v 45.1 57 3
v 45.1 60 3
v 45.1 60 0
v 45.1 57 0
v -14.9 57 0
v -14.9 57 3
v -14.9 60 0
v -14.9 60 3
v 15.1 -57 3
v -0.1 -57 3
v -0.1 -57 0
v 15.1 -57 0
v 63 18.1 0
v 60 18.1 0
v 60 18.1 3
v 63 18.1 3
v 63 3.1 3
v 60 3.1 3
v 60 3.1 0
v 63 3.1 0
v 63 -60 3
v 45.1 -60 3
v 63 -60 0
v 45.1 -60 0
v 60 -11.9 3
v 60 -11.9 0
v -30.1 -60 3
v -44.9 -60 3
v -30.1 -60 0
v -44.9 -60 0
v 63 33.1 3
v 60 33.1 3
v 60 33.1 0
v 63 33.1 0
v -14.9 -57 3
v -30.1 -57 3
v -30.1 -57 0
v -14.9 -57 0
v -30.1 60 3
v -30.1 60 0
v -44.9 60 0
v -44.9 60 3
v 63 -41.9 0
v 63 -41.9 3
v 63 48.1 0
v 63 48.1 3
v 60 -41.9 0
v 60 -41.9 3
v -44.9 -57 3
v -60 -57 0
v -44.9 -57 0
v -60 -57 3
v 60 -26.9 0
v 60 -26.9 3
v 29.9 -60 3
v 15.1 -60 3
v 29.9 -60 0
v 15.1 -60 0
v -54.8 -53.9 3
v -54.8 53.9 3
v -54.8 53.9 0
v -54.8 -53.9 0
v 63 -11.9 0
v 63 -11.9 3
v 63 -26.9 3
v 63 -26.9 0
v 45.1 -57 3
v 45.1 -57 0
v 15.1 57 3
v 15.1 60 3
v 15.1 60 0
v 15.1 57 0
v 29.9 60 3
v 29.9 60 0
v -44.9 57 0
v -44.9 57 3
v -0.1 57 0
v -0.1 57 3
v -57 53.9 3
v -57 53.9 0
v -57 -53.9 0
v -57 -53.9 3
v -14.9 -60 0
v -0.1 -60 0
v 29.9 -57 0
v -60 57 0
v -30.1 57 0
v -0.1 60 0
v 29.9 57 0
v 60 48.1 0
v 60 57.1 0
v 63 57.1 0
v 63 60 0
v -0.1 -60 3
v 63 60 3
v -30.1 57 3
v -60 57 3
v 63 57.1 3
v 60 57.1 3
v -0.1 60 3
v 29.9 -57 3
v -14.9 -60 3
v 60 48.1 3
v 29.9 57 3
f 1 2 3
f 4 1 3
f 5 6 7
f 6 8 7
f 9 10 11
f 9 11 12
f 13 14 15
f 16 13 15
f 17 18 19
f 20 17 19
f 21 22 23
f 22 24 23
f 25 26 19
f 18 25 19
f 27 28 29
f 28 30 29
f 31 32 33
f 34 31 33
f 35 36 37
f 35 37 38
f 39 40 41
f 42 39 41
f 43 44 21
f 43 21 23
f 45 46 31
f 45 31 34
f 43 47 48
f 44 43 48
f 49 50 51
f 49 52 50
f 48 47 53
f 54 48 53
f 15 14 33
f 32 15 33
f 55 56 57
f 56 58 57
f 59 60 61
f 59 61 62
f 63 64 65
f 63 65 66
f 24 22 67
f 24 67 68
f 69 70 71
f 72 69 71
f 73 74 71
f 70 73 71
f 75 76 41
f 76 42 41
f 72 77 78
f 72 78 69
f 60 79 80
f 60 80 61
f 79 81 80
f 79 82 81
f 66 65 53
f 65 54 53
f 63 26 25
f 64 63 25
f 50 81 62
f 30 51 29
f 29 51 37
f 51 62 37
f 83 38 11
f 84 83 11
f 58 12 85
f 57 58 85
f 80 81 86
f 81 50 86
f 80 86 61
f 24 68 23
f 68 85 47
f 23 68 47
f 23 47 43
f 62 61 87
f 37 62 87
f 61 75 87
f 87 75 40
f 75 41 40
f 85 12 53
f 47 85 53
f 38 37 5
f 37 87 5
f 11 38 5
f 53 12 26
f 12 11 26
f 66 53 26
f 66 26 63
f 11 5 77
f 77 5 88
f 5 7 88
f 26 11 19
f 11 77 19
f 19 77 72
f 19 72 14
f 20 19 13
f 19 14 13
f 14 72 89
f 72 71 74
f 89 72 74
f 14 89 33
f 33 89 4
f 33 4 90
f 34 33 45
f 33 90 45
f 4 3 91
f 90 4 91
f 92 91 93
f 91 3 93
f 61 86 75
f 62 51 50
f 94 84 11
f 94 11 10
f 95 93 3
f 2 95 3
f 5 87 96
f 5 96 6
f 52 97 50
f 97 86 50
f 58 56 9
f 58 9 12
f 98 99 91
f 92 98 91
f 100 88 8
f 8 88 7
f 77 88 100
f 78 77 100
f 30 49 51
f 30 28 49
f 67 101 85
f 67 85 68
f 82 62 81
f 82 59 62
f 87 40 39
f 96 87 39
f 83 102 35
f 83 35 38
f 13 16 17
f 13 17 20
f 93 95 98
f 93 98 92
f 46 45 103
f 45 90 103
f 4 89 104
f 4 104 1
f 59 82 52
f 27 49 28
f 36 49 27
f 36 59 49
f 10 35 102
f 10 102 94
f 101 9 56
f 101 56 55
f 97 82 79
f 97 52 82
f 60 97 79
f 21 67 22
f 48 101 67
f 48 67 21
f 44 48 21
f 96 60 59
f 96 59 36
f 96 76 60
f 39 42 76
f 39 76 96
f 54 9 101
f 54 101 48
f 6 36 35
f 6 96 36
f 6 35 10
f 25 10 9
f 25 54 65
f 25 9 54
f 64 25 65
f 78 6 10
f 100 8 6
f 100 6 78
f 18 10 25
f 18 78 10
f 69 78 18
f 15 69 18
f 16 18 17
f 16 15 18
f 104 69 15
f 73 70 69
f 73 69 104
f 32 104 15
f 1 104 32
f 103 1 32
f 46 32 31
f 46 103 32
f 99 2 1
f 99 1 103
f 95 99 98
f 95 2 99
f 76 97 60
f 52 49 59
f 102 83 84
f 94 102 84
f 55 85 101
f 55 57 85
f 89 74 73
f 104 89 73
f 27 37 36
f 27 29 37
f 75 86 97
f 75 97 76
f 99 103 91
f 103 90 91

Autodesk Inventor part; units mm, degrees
ref_plane "YZ Plane" through (0, 0, 0) normal (1, 0, 0) x (0, 1, 0)
ref_plane "XZ Plane" through (0, 0, 0) normal (0, 1, 0) x (-1, 0, 0)
ref_plane "XY Plane" through (0, 0, 0) normal (0, 0, 1) x (1, 0, 0)
sketch "Esboço1" plane through (0, 0, 0) normal (0, 0, 1) x (1, 0, 0)
  line L0 (-60, -60) -> (60, -60)
  line L1 (60, -60) -> (60, 60)
  line L2 (60, 60) -> (-60, 60)
  line L3 (-60, 60) -> (-60, -60)
  line L4 (-60, -60) -> (60, 60) construction
  line L5 (60, -60) -> (-60, 60) construction
  point P0 (0, 0)
  dimension "d0" = 120
  dimension "d1" = 120
extrude "Extrusão1" add sketch "Esboço1" along normal blind 3
sketch "Esboço2" plane through (-60, 60, 0) normal (0, 1, 0) x (1, 0, 0)
  line L0 (120, -3) -> (0, -3) projected
  line L1 (120, 0) -> (0, 0) projected
  line L2 (0, -3) -> (15.1, -3)
  line L3 (15.1, -3) -> (15.1, 0)
  line L4 (15.1, 0) -> (0, 0)
  line L5 (0, 0) -> (0, -3)
  line L6 (-0.1, 0) -> (-0.1, -3)
  line L7 (29.9, 0) -> (29.9, -3)
  line L8 (45.1, 0) -> (30, 0)
  line L9 (30, -3) -> (45.1, -3)
  line L10 (45.1, -3) -> (45.1, 0)
  line L11 (59.9, 0) -> (59.9, -3)
  line L12 (75.1, 0) -> (60, 0)
  line L13 (60, -3) -> (75.1, -3)
  line L14 (75.1, -3) -> (75.1, 0)
  line L15 (89.9, 0) -> (89.9, -3)
  line L16 (105.1, 0) -> (90, 0)
  line L17 (90, -3) -> (105.1, -3)
  line L18 (105.1, -3) -> (105.1, 0)
  point P0 (89.9, 0)
  point P1 (59.9, 0)
  point P2 (29.9, 0)
  dimension "d4" = 15.1
  dimension "d57" = 30
  dimension "d63" = 0.1
extrude "Extrusão2" cut sketch "Esboço2" against normal blind 3 contours L0 L15 L1 L18 | L0 L11 L1 L14 | L0 L7 L1 L10 | L0 L5 L1 L3
sketch "Esboço3" plane through (-60, -60, 0) normal (0, -1, 0) x (1, 0, 0)
  line L0 (0, 0) -> (120, 0) projected
  line L1 (0, 3) -> (15.1, 3)
  line L2 (15.1, 3) -> (15.1, 0)
  line L3 (15.1, 0) -> (0, 0)
  line L4 (0, 0) -> (0, 3)
  line L5 (-0.1, 0) -> (-0.1, 3)
  line L6 (-0.1, 0) -> (15.1, 0)
  line L7 (15.1, 0) -> (15.1, 3)
  line L8 (15.1, 3) -> (-0.1, 3)
  line L9 (-0.1, 3) -> (-0.1, 0)
  line L10 (29.9, 0) -> (29.9, 3)
  line L11 (45.1, 0) -> (30, 0)
  line L12 (30, 3) -> (45.1, 3)
  line L13 (45.1, 3) -> (45.1, 0)
  line L14 (59.9, 0) -> (59.9, 3)
  line L15 (75.1, 0) -> (60, 0)
  line L16 (60, 3) -> (75.1, 3)
  line L17 (75.1, 3) -> (75.1, 0)
  line L18 (89.9, 0) -> (89.9, 3)
  line L19 (105.1, 0) -> (90, 0)
  line L20 (90, 3) -> (105.1, 3)
  line L21 (105.1, 3) -> (105.1, 0)
  line L22 (0, 0) -> (0, 3) projected
  line L23 (0, 3) -> (120, 3) projected
  line L24 (120, 3) -> (120, 0) projected
  line L25 (120, 0) -> (0, 0) projected
  point P0 (-0.1, 1.5)
  point P1 (29.9, 1.5)
  point P2 (59.9, 1.5)
  point P3 (89.9, 1.5)
  point P4 (105.1, 0)
  point P5 (89.9, 0)
  point P6 (75.1, 0)
  point P7 (59.9, 0)
  point P8 (45.1, 0)
  point P9 (29.9, 0)
  dimension "d14" = 15.1
  dimension "d47" = 15.2
  dimension "d50" = 30
  dimension "d64" = 0.1
extrude "Extrusão3" cut sketch "Esboço3" against normal blind 3 contours L4 L1 L2 L0 | L10 L23 L12 L13 L0 | L14 L23 L16 L17 L0 | L18 L23 L20 L21 L0
sketch "Esboço5" plane through (60, -60, 0) normal (1, 0, 0) x (0, 0, -1)
  line L0 (0, 3) -> (-3, 3) projected
  line L1 (-3, 3) -> (0, 3)
  line L2 (0, 3) -> (0, 18.1)
  line L3 (0, 18.1) -> (-3, 18.1)
  line L4 (-3, 18.1) -> (-3, 3)
  line L5 (0, 0) -> (-3, 0) projected
  line L6 (-3, 0) -> (-3, 120) projected
  line L7 (-3, 120) -> (0, 120) projected
  line L8 (0, 120) -> (0, 0) projected
  line L9 (0, 0) -> (-3, 0) projected
  line L10 (-3, 0) -> (-3, 120) projected
  line L11 (-3, 120) -> (0, 120) projected
  line L12 (0, 120) -> (0, 0) projected
  line L13 (-3, 3.1) -> (0, 3.1)
  line L14 (-3, 33.1) -> (0, 33.1)
  line L15 (0, 48.1) -> (-3, 48.1)
  line L16 (-3, 63.1) -> (0, 63.1)
  line L17 (0, 78.1) -> (-3, 78.1)
  line L18 (-3, 93.1) -> (0, 93.1)
  line L19 (0, 108.1) -> (-3, 108.1)
  line L20 (-3, 123.1) -> (0, 123.1)
  line L21 (0, 138.1) -> (-3, 138.1)
  line L22 (-3, 153.1) -> (0, 153.1)
  line L23 (0, 168.1) -> (-3, 168.1)
  line L24 (-3, 183.1) -> (0, 183.1)
  line L25 (0, 198.1) -> (-3, 198.1)
  line L26 (-3, 213.1) -> (0, 213.1)
  line L27 (0, 228.1) -> (-3, 228.1)
  line L28 (-3, 243.1) -> (0, 243.1)
  line L29 (0, 258.1) -> (-3, 258.1)
  line L30 (-3, 273.1) -> (0, 273.1)
  line L31 (0, 288.1) -> (-3, 288.1)
  line L32 (-3, 117.1) -> (0, 117.1)
  point P0 (-1.5, 3)
  point P1 (-3, 3.1)
  point P2 (-1.5, 120)
  dimension "d35" = 3
  dimension "d36" = 15.1
  dimension "d65" = 0.1
  dimension "d68" = 30
  dimension "d73" = 2.9
extrude "Extrusão5" add sketch "Esboço5" along normal blind 3 contours L8 L5 L6 L0 | L0 L4 L13 L2 | L13 L4 L3 L2 | L14 L6 L15 L8 | L16 L6 L17 L8 | L18 L6 L19 L8 | L32 L6 L7 L8
sketch "Esboço6" plane through (0, 0, 3) normal (0, 0, 1) x (1, 0, 0)
  line L0 (-54.8, -53.9) -> (-57, -53.9)
  line L1 (-57, -53.9) -> (-57, 53.9)
  line L2 (-57, 53.9) -> (-54.8, 53.9)
  line L3 (-54.8, 53.9) -> (-54.8, -53.9)
  line L4 (-54.8, -53.9) -> (-57, 53.9) construction
  line L5 (-57, -53.9) -> (-54.8, 53.9) construction
  line L6 (-44.9, 57) -> (-60, 57) projected
  line L7 (-60, 57) -> (-60, -57) projected
  point P0 (0, 0)
  point P1 (-55.9, 0)
  dimension "d74" = 3.1
  dimension "d75" = 3
  dimension "d76" = 2.2
extrude "Extrusão6" cut sketch "Esboço6" against normal up to surface (3 mm away)
properties part number "Base"
